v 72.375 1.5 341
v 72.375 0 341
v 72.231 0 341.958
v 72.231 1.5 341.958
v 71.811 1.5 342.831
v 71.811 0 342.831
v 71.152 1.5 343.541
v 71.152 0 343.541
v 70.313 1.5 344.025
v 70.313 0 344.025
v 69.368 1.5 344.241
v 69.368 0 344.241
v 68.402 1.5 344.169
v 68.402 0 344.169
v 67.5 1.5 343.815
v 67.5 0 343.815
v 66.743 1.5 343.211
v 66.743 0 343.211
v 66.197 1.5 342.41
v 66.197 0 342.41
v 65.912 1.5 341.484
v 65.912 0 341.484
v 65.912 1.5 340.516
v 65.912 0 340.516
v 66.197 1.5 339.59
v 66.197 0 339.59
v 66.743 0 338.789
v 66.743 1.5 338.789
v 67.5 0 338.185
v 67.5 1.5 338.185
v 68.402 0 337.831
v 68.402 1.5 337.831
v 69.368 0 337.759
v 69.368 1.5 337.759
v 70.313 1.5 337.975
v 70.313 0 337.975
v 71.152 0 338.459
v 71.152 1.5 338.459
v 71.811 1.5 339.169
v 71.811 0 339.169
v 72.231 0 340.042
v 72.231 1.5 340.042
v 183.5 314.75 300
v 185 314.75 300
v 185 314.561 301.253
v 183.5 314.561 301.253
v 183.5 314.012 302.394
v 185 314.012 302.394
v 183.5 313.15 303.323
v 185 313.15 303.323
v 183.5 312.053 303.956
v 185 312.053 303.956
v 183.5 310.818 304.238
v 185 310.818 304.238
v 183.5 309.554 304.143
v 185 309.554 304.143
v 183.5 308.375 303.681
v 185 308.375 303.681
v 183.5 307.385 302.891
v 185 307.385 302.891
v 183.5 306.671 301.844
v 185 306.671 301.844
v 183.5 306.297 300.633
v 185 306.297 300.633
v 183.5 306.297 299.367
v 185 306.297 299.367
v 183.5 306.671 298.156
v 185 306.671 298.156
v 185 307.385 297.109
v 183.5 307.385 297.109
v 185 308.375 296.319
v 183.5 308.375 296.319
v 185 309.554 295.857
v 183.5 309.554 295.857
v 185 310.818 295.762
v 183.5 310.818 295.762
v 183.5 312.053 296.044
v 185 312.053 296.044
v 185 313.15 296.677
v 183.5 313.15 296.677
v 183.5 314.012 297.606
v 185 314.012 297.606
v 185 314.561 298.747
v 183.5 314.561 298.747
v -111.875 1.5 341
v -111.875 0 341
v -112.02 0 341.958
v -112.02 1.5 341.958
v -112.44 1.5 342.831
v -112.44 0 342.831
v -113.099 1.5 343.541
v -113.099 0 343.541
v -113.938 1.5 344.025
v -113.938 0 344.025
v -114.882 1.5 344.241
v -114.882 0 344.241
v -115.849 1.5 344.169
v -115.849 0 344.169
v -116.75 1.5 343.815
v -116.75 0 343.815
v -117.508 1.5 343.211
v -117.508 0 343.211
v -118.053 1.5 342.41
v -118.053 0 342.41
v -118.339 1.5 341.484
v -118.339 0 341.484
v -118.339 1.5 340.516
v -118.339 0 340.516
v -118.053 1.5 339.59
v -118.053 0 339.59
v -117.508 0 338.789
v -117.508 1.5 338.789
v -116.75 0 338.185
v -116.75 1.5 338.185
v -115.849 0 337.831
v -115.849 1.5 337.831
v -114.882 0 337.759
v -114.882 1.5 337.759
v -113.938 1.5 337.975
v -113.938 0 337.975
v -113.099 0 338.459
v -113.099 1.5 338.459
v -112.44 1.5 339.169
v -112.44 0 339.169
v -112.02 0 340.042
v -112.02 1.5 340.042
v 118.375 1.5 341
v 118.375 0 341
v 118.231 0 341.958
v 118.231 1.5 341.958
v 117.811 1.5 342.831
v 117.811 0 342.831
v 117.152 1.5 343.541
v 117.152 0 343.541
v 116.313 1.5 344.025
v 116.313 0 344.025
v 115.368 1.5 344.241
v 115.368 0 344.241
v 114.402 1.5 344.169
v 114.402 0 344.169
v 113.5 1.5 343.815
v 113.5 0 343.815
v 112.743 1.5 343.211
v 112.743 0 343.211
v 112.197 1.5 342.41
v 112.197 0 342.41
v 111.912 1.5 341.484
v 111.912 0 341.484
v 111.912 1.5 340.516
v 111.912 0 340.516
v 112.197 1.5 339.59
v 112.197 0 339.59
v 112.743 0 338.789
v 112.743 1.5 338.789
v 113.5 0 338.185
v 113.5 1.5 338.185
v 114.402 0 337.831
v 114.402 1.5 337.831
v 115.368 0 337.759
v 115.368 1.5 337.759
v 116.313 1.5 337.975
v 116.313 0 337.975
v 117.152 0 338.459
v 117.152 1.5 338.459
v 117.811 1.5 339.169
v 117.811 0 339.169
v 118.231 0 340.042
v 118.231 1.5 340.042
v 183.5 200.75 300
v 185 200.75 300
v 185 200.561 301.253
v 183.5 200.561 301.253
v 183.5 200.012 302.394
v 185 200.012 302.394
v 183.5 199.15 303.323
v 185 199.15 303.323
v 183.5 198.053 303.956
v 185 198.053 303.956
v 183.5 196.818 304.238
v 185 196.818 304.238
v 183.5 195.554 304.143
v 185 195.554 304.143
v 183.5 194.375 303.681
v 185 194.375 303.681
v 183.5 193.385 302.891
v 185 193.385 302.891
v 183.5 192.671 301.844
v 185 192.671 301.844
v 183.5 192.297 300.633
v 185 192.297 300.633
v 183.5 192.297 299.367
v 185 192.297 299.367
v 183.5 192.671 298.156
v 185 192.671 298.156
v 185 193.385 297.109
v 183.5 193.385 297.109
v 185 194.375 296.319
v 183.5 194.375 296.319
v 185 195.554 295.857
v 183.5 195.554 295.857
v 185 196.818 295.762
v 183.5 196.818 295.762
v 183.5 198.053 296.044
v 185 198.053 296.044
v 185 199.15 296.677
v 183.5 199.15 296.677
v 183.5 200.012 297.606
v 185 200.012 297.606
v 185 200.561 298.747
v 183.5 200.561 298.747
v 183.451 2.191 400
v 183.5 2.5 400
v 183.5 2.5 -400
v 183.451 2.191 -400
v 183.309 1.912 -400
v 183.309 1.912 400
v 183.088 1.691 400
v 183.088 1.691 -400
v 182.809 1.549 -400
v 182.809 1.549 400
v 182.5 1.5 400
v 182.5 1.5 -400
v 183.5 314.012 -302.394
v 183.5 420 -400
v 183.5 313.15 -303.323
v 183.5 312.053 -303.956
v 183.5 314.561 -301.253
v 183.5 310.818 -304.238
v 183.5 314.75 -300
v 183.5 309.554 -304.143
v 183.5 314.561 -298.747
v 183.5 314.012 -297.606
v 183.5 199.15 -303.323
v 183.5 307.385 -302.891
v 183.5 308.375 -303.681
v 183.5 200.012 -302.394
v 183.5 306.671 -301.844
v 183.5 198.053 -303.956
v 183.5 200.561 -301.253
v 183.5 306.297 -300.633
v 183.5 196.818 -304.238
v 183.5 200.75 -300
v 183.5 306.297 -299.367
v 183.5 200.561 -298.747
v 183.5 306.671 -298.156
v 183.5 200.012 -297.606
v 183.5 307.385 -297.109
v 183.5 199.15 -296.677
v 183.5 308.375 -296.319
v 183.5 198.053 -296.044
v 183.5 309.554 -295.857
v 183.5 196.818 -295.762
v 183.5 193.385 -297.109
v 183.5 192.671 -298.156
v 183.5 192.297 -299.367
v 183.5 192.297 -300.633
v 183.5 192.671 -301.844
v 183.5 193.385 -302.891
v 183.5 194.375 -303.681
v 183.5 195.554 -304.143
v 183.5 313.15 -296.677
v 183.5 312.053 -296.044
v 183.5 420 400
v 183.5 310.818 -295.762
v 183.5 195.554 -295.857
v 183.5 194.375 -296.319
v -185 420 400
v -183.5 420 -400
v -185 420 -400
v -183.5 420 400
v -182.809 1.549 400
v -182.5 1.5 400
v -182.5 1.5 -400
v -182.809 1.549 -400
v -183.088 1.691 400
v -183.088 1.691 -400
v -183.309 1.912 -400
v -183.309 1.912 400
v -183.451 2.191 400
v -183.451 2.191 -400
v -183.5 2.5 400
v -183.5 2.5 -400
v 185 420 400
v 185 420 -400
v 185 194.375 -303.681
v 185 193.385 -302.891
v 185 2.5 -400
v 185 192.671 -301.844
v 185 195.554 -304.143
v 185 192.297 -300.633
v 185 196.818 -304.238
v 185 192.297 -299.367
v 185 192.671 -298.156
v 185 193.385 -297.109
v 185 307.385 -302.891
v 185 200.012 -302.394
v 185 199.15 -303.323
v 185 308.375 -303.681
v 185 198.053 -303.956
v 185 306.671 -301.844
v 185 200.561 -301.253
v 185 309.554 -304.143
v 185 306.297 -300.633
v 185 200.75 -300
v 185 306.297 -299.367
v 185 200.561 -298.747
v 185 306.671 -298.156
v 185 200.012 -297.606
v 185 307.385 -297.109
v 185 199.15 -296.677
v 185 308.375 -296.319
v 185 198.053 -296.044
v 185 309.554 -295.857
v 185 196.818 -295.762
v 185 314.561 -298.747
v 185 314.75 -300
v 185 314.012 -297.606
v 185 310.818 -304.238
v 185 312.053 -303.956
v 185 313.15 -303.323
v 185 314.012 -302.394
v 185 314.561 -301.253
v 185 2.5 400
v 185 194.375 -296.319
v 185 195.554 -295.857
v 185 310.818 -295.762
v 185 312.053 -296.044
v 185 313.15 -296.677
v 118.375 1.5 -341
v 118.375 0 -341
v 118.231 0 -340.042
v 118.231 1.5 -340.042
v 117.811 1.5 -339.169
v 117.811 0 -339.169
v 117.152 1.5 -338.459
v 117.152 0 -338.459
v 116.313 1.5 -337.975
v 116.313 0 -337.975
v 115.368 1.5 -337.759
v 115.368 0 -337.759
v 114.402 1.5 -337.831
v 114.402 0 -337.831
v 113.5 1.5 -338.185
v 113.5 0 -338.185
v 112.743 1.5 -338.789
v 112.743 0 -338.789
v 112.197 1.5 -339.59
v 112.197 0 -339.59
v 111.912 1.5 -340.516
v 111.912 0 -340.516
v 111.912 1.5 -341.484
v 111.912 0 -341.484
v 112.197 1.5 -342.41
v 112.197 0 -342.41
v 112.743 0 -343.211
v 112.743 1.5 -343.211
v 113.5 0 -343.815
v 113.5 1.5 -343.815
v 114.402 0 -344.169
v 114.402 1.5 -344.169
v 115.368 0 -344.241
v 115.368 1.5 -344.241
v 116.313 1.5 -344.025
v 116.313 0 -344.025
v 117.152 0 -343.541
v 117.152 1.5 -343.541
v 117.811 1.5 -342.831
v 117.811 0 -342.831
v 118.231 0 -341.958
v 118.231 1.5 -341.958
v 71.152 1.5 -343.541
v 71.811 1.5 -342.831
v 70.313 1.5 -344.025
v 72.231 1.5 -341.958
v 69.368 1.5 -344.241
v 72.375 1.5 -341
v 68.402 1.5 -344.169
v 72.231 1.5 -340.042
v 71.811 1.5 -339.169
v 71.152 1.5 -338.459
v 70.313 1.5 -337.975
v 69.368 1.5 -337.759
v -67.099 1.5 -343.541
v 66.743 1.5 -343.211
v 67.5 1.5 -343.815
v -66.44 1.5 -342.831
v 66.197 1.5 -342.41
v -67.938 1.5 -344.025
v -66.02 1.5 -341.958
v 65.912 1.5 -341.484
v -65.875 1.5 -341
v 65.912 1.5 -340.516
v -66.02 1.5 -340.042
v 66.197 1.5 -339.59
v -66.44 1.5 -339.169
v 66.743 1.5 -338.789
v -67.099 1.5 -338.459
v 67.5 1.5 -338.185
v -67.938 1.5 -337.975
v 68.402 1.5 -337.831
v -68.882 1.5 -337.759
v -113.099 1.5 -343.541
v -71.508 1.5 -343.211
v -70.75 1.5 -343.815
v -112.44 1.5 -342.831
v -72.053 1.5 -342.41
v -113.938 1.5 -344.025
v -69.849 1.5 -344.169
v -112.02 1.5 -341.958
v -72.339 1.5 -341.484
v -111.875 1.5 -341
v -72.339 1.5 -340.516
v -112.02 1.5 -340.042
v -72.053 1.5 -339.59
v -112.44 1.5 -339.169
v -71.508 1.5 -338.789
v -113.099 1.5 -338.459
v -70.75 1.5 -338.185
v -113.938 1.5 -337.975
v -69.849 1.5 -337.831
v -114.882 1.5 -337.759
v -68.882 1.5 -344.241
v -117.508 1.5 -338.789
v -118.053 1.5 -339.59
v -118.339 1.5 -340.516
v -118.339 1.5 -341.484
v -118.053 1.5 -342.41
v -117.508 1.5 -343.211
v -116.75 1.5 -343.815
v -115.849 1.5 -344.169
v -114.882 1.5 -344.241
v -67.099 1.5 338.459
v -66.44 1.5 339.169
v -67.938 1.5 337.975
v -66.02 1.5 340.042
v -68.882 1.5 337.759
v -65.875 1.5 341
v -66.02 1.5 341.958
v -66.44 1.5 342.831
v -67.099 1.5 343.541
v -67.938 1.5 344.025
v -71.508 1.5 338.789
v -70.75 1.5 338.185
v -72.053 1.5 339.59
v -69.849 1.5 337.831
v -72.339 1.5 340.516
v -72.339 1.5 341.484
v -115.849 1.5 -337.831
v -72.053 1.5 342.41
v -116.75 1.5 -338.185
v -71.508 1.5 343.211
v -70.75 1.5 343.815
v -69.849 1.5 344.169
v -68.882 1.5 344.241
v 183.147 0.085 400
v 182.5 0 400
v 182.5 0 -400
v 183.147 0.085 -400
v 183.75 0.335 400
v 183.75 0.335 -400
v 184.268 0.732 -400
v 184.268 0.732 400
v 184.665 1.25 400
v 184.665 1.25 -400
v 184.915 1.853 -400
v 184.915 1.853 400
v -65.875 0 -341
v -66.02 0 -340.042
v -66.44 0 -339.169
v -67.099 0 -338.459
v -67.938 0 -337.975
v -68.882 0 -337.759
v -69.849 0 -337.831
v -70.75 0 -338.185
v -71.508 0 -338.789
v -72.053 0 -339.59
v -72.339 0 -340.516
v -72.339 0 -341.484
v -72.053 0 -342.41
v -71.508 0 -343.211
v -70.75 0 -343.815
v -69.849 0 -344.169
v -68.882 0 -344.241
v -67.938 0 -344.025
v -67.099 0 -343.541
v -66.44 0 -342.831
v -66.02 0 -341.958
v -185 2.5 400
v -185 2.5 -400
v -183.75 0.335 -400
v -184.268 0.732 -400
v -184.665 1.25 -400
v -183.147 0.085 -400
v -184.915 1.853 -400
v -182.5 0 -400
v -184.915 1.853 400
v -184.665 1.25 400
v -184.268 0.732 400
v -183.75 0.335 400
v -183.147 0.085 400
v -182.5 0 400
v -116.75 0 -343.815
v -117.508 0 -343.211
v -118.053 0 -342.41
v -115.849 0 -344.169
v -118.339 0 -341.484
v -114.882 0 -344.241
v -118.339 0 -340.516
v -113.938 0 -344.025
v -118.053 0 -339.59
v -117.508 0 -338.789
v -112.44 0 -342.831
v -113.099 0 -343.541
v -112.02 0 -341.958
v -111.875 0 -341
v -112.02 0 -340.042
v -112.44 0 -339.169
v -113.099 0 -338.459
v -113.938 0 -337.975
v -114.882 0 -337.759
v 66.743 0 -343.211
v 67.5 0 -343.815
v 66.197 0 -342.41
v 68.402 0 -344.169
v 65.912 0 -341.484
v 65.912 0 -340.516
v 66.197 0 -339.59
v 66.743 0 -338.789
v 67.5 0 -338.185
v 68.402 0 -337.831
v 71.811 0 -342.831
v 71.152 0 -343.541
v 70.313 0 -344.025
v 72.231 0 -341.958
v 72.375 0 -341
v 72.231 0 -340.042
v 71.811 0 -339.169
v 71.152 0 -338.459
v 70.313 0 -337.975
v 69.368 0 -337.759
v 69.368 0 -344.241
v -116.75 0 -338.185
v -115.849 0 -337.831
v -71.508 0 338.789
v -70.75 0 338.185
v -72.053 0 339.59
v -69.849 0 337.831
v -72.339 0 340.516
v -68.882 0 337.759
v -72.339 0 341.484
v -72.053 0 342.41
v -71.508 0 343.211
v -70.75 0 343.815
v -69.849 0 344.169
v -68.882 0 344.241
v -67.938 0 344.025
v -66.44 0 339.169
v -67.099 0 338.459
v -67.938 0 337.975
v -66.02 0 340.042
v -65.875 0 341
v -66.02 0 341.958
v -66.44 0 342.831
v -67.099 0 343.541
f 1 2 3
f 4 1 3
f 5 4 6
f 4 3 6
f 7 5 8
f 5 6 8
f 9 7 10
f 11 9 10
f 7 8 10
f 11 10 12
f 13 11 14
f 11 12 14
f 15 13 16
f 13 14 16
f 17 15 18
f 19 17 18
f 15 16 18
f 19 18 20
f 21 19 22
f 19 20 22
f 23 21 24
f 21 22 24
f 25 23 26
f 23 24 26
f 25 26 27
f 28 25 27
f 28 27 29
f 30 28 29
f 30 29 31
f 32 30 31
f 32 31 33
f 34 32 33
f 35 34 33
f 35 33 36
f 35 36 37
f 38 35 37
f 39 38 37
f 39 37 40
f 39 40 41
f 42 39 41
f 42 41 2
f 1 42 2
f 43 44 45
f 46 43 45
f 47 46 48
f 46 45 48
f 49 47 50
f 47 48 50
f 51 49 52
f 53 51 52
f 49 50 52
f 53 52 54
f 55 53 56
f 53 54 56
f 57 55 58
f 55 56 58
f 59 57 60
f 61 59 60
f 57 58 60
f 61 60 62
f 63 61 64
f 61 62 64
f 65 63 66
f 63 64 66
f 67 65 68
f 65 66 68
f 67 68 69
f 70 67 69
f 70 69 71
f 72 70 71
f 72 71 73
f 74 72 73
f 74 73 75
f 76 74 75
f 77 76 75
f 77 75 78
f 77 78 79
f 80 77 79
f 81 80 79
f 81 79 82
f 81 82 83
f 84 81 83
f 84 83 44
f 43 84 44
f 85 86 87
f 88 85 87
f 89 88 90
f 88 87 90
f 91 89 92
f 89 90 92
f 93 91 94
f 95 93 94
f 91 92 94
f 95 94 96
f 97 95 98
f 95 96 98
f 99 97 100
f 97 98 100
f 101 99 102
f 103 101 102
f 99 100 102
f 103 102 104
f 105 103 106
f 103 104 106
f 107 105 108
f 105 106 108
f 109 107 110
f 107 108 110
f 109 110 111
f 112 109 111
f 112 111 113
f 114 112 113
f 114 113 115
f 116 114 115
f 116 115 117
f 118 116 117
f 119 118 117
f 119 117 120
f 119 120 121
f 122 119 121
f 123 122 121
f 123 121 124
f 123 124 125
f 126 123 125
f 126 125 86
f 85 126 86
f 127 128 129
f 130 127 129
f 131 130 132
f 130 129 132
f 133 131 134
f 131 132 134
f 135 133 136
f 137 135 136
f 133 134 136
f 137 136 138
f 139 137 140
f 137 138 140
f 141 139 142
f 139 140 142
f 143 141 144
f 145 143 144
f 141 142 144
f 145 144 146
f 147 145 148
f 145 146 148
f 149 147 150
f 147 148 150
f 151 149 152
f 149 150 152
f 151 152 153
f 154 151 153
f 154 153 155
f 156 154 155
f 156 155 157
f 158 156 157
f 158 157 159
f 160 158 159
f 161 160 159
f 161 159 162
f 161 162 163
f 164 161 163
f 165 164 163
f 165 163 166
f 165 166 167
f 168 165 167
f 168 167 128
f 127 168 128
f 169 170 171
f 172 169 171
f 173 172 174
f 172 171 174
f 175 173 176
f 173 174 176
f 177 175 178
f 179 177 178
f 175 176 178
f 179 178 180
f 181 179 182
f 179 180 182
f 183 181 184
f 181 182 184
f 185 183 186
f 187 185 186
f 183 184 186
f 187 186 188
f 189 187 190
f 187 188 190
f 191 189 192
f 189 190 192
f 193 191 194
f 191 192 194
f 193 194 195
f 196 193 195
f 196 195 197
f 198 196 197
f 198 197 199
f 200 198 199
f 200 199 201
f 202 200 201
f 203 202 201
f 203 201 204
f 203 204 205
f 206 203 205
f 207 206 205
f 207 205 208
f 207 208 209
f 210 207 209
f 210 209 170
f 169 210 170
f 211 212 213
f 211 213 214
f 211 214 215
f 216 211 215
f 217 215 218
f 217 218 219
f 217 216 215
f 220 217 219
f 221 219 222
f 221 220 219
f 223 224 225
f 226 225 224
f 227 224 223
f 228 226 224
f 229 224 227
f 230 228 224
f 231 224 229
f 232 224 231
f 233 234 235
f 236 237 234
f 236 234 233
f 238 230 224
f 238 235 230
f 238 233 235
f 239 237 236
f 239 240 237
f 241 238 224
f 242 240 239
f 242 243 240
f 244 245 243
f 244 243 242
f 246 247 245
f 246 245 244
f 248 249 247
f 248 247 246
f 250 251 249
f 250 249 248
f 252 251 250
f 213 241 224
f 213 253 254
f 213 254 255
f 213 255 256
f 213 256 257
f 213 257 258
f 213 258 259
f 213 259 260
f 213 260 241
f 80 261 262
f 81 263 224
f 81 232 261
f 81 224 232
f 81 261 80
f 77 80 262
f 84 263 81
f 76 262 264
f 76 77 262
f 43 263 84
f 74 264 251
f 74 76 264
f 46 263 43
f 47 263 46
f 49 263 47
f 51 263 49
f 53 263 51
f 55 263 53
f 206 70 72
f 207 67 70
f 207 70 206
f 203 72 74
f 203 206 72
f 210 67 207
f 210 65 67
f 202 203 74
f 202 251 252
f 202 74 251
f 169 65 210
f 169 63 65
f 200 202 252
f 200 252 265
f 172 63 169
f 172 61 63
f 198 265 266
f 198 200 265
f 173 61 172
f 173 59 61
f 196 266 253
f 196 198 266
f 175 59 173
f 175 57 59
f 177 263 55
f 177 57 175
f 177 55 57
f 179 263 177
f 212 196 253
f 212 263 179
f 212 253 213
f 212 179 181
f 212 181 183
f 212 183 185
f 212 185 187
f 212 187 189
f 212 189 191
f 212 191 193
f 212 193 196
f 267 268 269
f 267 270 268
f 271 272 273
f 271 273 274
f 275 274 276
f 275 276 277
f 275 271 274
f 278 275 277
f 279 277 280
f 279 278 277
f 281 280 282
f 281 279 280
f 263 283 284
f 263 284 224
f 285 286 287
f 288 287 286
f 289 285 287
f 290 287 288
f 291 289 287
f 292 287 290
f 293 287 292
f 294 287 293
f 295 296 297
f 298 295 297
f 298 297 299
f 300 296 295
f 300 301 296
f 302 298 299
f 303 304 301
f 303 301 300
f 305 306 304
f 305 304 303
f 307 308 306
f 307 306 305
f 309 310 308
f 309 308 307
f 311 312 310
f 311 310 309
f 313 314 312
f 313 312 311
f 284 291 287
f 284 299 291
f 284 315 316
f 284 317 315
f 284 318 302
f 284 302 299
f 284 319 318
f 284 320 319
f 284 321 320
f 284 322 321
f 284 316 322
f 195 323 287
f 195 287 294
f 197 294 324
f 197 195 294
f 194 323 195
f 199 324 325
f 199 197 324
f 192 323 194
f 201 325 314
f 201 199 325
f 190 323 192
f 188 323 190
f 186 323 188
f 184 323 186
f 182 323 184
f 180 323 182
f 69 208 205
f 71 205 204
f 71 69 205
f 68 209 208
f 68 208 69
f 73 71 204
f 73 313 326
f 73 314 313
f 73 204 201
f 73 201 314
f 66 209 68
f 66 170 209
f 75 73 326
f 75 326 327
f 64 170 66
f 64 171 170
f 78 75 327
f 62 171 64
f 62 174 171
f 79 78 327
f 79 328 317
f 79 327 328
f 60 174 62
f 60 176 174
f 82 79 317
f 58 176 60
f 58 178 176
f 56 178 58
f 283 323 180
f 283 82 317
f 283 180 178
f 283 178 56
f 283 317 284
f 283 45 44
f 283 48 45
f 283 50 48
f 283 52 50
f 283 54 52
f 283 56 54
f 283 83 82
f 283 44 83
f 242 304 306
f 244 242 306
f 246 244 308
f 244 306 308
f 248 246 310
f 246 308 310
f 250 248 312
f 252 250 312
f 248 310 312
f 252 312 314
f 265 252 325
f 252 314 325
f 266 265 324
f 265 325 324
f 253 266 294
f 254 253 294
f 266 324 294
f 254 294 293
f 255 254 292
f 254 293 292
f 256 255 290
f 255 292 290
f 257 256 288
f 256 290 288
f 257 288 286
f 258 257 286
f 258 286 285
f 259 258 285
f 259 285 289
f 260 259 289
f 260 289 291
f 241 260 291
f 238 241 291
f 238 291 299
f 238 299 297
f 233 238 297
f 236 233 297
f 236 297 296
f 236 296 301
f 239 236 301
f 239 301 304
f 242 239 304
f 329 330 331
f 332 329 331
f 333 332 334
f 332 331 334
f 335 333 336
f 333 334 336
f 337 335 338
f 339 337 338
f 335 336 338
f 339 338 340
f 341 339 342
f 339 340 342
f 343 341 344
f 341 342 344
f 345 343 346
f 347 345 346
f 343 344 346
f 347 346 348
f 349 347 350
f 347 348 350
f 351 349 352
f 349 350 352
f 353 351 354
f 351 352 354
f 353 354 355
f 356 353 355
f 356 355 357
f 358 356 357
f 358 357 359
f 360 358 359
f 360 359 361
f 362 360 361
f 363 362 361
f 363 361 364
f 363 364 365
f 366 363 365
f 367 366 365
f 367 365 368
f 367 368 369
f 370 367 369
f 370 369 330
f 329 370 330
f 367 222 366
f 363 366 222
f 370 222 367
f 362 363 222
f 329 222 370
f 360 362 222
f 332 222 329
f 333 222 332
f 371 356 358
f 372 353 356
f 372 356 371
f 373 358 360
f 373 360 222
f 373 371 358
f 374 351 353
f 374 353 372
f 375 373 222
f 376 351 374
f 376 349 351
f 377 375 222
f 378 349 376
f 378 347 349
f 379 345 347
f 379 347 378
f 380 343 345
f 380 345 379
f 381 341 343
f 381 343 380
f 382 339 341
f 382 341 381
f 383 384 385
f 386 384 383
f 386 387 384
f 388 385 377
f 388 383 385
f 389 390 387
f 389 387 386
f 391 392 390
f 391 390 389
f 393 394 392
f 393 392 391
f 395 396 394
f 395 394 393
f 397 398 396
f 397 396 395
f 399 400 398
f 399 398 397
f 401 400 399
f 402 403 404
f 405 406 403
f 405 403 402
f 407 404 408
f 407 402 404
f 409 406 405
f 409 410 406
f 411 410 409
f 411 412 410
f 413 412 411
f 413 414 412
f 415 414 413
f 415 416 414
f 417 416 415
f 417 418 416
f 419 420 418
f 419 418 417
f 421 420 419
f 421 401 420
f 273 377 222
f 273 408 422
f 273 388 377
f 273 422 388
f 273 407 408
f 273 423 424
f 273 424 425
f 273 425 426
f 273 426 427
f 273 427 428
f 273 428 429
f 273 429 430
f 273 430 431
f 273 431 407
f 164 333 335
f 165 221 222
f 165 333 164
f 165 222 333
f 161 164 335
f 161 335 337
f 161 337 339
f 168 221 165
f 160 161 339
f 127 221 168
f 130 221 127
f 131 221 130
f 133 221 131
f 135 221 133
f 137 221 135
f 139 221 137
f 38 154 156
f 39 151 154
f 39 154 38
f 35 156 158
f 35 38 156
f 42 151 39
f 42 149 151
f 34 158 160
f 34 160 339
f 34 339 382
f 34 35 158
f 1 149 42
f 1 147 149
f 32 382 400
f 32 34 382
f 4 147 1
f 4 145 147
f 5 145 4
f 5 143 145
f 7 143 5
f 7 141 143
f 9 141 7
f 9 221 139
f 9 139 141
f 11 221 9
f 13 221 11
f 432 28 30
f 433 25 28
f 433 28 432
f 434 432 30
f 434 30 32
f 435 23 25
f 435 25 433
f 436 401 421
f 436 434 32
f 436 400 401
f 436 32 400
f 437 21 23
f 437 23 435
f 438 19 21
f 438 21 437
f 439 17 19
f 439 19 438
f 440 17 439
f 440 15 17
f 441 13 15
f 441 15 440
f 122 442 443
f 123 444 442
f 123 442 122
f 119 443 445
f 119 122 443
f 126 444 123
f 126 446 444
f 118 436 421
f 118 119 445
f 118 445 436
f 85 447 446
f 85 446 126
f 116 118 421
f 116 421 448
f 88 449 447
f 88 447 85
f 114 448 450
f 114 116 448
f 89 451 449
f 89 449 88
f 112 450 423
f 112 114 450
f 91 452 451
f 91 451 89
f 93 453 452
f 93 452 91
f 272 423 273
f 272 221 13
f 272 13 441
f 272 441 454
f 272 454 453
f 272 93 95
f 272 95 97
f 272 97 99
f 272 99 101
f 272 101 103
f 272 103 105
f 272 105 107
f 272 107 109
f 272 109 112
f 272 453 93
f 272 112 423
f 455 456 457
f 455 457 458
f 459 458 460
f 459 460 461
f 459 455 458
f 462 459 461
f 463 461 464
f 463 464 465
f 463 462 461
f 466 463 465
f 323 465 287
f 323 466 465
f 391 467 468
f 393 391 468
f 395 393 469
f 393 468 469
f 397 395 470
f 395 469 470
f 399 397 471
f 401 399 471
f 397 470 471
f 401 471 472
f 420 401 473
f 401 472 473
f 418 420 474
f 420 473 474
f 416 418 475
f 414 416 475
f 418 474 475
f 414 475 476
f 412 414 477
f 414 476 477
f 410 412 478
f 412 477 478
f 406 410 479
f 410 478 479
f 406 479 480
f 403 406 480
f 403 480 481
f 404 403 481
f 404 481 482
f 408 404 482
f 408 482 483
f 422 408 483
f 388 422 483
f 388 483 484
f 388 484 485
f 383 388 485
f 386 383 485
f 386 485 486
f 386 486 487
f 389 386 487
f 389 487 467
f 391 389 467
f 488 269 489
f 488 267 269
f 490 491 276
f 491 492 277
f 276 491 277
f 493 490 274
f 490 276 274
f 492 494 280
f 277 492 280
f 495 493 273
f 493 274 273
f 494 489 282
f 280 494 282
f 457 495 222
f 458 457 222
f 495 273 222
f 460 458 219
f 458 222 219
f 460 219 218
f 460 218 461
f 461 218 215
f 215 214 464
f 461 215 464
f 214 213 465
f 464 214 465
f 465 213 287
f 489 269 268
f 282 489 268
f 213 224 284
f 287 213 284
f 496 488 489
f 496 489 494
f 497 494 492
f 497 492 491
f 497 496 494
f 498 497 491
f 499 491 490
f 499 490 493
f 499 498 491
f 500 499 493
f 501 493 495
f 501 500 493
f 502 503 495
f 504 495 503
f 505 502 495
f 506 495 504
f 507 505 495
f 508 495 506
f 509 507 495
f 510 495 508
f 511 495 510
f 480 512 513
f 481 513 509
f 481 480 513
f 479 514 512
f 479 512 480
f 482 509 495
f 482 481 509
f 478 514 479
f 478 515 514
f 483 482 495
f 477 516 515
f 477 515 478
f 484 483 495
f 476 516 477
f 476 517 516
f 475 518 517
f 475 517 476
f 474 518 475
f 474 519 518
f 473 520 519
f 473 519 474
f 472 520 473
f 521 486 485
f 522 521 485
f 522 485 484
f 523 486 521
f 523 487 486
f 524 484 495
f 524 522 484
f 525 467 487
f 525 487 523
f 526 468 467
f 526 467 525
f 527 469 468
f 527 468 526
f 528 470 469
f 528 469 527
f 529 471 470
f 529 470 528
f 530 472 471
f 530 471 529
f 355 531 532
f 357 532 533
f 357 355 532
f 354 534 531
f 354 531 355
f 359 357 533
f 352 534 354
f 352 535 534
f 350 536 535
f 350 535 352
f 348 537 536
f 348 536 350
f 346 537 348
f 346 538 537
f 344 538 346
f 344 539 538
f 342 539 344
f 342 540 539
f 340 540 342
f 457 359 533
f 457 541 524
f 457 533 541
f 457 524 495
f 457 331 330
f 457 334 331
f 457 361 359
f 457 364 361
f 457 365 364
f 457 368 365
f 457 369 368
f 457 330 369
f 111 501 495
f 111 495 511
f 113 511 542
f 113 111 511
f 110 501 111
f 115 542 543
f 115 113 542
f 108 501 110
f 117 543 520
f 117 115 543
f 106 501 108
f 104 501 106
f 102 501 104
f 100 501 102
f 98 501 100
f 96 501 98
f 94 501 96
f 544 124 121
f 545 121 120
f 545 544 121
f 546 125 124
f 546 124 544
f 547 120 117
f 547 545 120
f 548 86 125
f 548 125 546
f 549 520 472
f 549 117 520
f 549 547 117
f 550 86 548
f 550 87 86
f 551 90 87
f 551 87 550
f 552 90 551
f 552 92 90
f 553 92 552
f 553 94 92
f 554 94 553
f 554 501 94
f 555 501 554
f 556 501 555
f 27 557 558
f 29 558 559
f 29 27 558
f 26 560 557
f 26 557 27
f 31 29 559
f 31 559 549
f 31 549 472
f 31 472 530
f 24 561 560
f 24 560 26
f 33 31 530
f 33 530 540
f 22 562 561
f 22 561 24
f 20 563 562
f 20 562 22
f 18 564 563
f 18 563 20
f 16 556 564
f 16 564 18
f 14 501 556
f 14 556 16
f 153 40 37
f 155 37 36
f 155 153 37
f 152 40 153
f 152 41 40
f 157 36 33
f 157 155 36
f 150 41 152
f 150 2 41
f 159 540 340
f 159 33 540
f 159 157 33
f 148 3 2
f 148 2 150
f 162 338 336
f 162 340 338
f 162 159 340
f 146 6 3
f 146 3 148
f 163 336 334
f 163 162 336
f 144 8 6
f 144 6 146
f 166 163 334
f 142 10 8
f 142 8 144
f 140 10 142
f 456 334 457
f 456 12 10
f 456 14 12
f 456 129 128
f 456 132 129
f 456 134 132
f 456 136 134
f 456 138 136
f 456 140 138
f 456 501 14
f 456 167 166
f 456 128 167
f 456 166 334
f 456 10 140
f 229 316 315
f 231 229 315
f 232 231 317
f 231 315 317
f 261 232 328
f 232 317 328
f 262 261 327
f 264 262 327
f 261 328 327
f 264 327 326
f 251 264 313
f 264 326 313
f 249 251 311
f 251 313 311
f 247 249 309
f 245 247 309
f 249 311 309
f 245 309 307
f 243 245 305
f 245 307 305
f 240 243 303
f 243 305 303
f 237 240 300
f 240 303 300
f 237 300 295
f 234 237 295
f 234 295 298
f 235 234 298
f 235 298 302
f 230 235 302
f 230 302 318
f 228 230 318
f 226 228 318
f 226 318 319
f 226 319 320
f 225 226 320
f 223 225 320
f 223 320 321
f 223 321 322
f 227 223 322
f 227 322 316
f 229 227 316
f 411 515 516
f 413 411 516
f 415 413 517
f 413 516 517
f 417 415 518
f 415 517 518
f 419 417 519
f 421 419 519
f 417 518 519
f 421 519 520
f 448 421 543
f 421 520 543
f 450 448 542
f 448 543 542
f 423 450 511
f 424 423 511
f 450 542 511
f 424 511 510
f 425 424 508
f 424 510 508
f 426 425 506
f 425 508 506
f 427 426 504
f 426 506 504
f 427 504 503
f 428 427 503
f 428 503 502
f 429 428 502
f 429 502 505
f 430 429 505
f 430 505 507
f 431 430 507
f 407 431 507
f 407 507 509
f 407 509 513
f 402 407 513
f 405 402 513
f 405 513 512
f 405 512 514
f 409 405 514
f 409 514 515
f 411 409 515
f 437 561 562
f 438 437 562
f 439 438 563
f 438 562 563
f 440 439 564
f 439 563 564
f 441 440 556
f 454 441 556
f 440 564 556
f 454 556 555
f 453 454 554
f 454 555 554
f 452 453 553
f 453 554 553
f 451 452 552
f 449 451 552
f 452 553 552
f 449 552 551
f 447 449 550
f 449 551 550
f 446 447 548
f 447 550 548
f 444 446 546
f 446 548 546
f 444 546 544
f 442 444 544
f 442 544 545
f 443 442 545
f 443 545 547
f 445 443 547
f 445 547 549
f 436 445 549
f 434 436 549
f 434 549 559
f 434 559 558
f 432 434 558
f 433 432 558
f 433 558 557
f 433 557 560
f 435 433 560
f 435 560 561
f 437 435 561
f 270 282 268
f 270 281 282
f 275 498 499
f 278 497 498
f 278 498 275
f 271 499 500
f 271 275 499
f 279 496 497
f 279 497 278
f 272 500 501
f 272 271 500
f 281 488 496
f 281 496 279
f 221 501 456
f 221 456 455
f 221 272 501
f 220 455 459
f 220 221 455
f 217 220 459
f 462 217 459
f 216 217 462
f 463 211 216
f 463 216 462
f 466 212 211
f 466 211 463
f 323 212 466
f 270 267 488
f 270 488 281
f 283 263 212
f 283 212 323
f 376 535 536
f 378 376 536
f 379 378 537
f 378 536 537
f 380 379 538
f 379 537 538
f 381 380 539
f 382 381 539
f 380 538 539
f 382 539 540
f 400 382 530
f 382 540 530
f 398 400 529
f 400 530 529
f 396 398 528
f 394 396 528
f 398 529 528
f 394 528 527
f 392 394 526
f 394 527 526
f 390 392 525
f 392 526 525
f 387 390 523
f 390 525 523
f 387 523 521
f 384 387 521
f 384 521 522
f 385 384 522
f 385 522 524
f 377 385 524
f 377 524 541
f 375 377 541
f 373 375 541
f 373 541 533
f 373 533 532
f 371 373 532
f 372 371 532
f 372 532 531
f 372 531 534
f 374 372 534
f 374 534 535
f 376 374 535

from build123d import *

# Parameters (mm, degrees)
TABAN_FLAN_1_DEPTH    = 400
IZIM6_R               = 3.25
KES_EKSTR_ZYON1_DEPTH = 10
IZIM7_R               = 4.25
KES_EKSTR_ZYON2_DEPTH = 10


# Sheet-metal steps are written as plain solids
with BuildPart() as part:
    # Çizim1 → Taban-Flanş1 (new, symmetric)
    with BuildSketch(Plane.XY):
        with BuildLine():
            Line((-185, 420), (-185, 2.5))
            ThreePointArc((-185, 2.5), (-184.267766953, 0.732233047), (-182.5, 0))
            Line((-182.5, 0), (182.5, 0))
            ThreePointArc((182.5, 0), (184.267766953, 0.732233047), (185, 2.5))
            Line((185, 2.5), (185, 420))
            Line((185, 420), (183.5, 420))
            Line((183.5, 420), (183.5, 2.5))
            ThreePointArc((183.5, 2.5), (183.207106781, 1.792893219), (182.5, 1.5))
            Line((182.5, 1.5), (-182.5, 1.5))
            ThreePointArc((-182.5, 1.5), (-183.207106781, 1.792893219), (-183.5, 2.5))
            Line((-183.5, 2.5), (-183.5, 420))
            Line((-183.5, 420), (-185, 420))
        make_face()
    extrude(amount=TABAN_FLAN_1_DEPTH, both=True)

    # Çizim6 → Kes-Ekstrüzyon1 (cut)
    with BuildSketch(Plane.XZ):
        with Locations((-115.125314072, 341)):
            Circle(IZIM6_R)
        with Locations((-69.125314072, 341)):
            Circle(IZIM6_R)
        with Locations((69.125314072, 341)):
            Circle(IZIM6_R)
        with Locations((115.125314072, 341)):
            Circle(IZIM6_R)
        with Locations((115.125314072, -341)):
            Circle(IZIM6_R)
        with Locations((69.125314072, -341)):
            Circle(IZIM6_R)
        with Locations((-69.125314072, -341)):
            Circle(IZIM6_R)
        with Locations((-115.125314072, -341)):
            Circle(IZIM6_R)
    extrude(amount=-KES_EKSTR_ZYON1_DEPTH, mode=Mode.SUBTRACT)

    # Çizim7 → Kes-Ekstrüzyon2 (cut)
    with BuildSketch(Plane(origin=(185, 0, 0), x_dir=(0, 0, -1), z_dir=(1, 0, 0))):
        with Locations(Location((-300, 310.5, 0), (0, 0, 90))):
            Circle(IZIM7_R)
        with Locations(Location((-300, 196.5, 0), (0, 0, 90))):
            Circle(IZIM7_R)
        with Locations(Location((300, 196.5, 0), (0, 0, 90))):
            Circle(IZIM7_R)
        with Locations(Location((300, 310.5, 0), (0, 0, 90))):
            Circle(IZIM7_R)
    extrude(amount=-KES_EKSTR_ZYON2_DEPTH, mode=Mode.SUBTRACT)


solid = part.part
